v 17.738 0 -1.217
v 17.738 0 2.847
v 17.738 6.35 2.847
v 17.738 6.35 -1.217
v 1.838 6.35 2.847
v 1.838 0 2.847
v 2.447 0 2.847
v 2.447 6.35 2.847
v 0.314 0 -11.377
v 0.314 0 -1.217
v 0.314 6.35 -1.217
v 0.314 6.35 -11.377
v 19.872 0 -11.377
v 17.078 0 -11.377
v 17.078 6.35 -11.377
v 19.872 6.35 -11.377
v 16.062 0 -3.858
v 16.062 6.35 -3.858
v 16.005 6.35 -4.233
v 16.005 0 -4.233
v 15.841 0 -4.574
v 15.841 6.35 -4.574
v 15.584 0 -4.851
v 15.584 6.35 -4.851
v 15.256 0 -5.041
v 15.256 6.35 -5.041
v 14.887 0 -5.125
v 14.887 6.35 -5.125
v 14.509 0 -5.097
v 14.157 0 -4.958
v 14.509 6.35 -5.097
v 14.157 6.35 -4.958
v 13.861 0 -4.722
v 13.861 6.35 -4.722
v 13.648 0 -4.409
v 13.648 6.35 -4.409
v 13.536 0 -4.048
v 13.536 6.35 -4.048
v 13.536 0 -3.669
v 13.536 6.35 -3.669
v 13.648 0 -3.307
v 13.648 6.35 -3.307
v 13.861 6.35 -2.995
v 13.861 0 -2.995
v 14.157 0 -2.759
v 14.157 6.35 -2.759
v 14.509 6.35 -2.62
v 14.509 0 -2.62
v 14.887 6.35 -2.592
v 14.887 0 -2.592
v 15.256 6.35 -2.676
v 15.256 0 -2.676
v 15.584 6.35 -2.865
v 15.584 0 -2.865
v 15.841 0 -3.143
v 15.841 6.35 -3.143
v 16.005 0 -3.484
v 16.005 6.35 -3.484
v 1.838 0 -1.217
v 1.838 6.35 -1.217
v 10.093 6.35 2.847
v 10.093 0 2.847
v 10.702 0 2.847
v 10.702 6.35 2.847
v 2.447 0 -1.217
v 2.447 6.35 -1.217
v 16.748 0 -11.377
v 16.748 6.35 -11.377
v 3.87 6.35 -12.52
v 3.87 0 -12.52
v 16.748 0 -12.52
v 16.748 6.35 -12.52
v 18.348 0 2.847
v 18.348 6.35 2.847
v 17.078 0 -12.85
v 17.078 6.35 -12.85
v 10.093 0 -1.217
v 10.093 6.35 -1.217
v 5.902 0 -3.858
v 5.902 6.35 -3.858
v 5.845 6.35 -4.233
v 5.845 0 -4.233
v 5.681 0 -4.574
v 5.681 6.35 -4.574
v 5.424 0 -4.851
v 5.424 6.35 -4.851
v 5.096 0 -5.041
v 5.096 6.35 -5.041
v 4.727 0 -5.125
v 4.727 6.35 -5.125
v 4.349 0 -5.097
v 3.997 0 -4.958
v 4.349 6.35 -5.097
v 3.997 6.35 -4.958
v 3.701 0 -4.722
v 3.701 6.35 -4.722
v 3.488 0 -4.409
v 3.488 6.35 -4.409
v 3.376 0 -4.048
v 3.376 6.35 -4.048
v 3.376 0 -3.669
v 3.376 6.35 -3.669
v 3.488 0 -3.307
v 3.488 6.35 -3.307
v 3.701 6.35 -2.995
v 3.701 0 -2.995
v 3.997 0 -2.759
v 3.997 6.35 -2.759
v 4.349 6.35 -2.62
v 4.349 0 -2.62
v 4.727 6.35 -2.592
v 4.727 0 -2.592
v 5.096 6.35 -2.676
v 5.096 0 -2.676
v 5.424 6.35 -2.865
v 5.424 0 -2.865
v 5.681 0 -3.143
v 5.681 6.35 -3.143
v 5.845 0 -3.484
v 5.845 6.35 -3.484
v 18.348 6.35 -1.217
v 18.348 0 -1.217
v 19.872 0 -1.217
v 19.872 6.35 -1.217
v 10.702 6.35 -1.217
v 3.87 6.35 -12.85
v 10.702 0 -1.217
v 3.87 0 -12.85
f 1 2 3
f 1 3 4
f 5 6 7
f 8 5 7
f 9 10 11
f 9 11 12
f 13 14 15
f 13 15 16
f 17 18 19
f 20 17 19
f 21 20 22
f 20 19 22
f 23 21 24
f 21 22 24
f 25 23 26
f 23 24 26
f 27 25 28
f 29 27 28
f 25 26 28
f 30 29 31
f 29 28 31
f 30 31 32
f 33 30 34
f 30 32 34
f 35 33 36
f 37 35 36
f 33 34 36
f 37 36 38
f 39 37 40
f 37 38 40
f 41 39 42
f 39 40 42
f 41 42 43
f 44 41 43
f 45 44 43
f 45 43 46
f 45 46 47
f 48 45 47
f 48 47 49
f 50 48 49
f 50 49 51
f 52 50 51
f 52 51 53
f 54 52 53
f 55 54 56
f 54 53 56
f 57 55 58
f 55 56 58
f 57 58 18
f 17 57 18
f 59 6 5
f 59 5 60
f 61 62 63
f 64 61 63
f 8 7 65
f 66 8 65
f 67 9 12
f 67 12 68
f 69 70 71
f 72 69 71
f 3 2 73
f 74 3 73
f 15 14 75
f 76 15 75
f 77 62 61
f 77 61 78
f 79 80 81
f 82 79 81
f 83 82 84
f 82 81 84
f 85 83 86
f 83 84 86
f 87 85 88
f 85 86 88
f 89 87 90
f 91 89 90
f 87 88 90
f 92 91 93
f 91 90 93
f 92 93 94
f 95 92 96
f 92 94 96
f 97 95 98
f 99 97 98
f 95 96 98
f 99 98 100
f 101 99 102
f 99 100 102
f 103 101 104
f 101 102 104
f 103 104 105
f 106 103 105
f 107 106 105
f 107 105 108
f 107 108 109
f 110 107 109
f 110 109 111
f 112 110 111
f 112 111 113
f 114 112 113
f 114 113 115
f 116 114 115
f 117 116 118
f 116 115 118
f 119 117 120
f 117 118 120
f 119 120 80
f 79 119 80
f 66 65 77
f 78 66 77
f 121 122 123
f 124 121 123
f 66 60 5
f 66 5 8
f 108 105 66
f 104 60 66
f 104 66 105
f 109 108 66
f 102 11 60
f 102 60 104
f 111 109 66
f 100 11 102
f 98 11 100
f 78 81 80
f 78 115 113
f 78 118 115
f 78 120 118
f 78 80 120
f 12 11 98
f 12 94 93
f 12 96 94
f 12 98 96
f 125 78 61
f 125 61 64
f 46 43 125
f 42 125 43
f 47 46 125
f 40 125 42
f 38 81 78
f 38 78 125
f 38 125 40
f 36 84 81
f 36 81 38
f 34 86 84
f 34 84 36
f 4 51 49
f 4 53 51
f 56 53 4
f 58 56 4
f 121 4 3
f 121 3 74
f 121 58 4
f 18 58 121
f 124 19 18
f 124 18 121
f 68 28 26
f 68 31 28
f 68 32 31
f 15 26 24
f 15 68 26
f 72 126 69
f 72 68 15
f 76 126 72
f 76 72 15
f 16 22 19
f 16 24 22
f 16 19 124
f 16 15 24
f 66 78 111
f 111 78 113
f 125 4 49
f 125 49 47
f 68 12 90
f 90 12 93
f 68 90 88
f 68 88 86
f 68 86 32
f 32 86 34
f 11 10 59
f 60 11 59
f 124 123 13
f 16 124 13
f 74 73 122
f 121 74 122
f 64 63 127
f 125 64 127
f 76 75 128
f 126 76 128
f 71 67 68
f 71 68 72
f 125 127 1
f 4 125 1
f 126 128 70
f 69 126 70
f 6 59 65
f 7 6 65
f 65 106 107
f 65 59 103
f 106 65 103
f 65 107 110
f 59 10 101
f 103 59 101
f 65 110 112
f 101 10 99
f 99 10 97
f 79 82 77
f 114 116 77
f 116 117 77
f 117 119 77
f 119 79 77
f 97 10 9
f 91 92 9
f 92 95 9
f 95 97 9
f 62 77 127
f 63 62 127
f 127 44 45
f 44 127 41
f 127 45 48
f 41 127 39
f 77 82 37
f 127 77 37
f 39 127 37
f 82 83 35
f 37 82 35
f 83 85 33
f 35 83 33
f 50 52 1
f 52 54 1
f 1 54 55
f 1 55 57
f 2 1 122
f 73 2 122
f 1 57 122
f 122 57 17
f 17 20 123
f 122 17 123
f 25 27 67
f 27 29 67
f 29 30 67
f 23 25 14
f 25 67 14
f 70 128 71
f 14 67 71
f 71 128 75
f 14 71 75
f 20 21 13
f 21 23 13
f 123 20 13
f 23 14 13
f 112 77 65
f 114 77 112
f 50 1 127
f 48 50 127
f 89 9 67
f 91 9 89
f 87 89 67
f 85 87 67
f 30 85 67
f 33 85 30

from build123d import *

# Parameters (mm, degrees)
SKETCH1_W           = 19.558
SKETCH1_H           = 10.16
SKETCH1_W_2         = 0.6096
SKETCH1_H_2         = 4.064
BOSS_EXTRUDE1_DEPTH = 6.35
SKETCH2_R           = 1.27
CUT_EXTRUDE1_DEPTH  = 6.35
SKETCH1_4_W         = 0.3302
SKETCH1_4_H         = 1.143
BOSS_EXTRUDE2_DEPTH = 6.35


with BuildPart() as part:
    # Sketch1 → Boss-Extrude1 (new body)
    with BuildSketch(Plane(origin=(0, 0, 0), x_dir=(1, 0, 0), z_dir=(0, 1, 0))):
        with Locations((10.092764077, 6.29705611)):
            Rectangle(SKETCH1_W, SKETCH1_H)
        with Locations((2.142564077, -0.81494389)):
            Rectangle(SKETCH1_W_2, SKETCH1_H_2)
        with Locations((18.042964077, -0.81494389)):
            Rectangle(SKETCH1_W_2, SKETCH1_H_2)
        with Locations((10.397564077, -0.81494389)):
            Rectangle(SKETCH1_W_2, SKETCH1_H_2)
    extrude(amount=BOSS_EXTRUDE1_DEPTH)

    # Sketch2 → Cut-Extrude1 (cut)
    with BuildSketch(Plane(origin=(0, 6.35, 0), x_dir=(1, 0, 0), z_dir=(0, 1, 0))):
        with Locations((4.631764077, 3.858413602)):
            Circle(SKETCH2_R)
        with Locations((14.791764077, 3.858413602)):
            Circle(SKETCH2_R)
    extrude(amount=-CUT_EXTRUDE1_DEPTH, mode=Mode.SUBTRACT)

    # Sketch1<4> → Boss-Extrude2 (add)
    with BuildSketch(Plane(origin=(0, 0, 0), x_dir=(1, 0, 0), z_dir=(0, 1, 0))):
        with Locations((16.912664077, 11.94855611)):
            Rectangle(SKETCH1_4_W, SKETCH1_4_H)
        Polygon((16.747564077, 12.52005611), (17.077764077, 12.52005611), (17.077764077, 12.85025611), (3.869764077, 12.85025611), (3.869764077, 12.52005611), align=None)
    extrude(amount=BOSS_EXTRUDE2_DEPTH)


solid = part.part
